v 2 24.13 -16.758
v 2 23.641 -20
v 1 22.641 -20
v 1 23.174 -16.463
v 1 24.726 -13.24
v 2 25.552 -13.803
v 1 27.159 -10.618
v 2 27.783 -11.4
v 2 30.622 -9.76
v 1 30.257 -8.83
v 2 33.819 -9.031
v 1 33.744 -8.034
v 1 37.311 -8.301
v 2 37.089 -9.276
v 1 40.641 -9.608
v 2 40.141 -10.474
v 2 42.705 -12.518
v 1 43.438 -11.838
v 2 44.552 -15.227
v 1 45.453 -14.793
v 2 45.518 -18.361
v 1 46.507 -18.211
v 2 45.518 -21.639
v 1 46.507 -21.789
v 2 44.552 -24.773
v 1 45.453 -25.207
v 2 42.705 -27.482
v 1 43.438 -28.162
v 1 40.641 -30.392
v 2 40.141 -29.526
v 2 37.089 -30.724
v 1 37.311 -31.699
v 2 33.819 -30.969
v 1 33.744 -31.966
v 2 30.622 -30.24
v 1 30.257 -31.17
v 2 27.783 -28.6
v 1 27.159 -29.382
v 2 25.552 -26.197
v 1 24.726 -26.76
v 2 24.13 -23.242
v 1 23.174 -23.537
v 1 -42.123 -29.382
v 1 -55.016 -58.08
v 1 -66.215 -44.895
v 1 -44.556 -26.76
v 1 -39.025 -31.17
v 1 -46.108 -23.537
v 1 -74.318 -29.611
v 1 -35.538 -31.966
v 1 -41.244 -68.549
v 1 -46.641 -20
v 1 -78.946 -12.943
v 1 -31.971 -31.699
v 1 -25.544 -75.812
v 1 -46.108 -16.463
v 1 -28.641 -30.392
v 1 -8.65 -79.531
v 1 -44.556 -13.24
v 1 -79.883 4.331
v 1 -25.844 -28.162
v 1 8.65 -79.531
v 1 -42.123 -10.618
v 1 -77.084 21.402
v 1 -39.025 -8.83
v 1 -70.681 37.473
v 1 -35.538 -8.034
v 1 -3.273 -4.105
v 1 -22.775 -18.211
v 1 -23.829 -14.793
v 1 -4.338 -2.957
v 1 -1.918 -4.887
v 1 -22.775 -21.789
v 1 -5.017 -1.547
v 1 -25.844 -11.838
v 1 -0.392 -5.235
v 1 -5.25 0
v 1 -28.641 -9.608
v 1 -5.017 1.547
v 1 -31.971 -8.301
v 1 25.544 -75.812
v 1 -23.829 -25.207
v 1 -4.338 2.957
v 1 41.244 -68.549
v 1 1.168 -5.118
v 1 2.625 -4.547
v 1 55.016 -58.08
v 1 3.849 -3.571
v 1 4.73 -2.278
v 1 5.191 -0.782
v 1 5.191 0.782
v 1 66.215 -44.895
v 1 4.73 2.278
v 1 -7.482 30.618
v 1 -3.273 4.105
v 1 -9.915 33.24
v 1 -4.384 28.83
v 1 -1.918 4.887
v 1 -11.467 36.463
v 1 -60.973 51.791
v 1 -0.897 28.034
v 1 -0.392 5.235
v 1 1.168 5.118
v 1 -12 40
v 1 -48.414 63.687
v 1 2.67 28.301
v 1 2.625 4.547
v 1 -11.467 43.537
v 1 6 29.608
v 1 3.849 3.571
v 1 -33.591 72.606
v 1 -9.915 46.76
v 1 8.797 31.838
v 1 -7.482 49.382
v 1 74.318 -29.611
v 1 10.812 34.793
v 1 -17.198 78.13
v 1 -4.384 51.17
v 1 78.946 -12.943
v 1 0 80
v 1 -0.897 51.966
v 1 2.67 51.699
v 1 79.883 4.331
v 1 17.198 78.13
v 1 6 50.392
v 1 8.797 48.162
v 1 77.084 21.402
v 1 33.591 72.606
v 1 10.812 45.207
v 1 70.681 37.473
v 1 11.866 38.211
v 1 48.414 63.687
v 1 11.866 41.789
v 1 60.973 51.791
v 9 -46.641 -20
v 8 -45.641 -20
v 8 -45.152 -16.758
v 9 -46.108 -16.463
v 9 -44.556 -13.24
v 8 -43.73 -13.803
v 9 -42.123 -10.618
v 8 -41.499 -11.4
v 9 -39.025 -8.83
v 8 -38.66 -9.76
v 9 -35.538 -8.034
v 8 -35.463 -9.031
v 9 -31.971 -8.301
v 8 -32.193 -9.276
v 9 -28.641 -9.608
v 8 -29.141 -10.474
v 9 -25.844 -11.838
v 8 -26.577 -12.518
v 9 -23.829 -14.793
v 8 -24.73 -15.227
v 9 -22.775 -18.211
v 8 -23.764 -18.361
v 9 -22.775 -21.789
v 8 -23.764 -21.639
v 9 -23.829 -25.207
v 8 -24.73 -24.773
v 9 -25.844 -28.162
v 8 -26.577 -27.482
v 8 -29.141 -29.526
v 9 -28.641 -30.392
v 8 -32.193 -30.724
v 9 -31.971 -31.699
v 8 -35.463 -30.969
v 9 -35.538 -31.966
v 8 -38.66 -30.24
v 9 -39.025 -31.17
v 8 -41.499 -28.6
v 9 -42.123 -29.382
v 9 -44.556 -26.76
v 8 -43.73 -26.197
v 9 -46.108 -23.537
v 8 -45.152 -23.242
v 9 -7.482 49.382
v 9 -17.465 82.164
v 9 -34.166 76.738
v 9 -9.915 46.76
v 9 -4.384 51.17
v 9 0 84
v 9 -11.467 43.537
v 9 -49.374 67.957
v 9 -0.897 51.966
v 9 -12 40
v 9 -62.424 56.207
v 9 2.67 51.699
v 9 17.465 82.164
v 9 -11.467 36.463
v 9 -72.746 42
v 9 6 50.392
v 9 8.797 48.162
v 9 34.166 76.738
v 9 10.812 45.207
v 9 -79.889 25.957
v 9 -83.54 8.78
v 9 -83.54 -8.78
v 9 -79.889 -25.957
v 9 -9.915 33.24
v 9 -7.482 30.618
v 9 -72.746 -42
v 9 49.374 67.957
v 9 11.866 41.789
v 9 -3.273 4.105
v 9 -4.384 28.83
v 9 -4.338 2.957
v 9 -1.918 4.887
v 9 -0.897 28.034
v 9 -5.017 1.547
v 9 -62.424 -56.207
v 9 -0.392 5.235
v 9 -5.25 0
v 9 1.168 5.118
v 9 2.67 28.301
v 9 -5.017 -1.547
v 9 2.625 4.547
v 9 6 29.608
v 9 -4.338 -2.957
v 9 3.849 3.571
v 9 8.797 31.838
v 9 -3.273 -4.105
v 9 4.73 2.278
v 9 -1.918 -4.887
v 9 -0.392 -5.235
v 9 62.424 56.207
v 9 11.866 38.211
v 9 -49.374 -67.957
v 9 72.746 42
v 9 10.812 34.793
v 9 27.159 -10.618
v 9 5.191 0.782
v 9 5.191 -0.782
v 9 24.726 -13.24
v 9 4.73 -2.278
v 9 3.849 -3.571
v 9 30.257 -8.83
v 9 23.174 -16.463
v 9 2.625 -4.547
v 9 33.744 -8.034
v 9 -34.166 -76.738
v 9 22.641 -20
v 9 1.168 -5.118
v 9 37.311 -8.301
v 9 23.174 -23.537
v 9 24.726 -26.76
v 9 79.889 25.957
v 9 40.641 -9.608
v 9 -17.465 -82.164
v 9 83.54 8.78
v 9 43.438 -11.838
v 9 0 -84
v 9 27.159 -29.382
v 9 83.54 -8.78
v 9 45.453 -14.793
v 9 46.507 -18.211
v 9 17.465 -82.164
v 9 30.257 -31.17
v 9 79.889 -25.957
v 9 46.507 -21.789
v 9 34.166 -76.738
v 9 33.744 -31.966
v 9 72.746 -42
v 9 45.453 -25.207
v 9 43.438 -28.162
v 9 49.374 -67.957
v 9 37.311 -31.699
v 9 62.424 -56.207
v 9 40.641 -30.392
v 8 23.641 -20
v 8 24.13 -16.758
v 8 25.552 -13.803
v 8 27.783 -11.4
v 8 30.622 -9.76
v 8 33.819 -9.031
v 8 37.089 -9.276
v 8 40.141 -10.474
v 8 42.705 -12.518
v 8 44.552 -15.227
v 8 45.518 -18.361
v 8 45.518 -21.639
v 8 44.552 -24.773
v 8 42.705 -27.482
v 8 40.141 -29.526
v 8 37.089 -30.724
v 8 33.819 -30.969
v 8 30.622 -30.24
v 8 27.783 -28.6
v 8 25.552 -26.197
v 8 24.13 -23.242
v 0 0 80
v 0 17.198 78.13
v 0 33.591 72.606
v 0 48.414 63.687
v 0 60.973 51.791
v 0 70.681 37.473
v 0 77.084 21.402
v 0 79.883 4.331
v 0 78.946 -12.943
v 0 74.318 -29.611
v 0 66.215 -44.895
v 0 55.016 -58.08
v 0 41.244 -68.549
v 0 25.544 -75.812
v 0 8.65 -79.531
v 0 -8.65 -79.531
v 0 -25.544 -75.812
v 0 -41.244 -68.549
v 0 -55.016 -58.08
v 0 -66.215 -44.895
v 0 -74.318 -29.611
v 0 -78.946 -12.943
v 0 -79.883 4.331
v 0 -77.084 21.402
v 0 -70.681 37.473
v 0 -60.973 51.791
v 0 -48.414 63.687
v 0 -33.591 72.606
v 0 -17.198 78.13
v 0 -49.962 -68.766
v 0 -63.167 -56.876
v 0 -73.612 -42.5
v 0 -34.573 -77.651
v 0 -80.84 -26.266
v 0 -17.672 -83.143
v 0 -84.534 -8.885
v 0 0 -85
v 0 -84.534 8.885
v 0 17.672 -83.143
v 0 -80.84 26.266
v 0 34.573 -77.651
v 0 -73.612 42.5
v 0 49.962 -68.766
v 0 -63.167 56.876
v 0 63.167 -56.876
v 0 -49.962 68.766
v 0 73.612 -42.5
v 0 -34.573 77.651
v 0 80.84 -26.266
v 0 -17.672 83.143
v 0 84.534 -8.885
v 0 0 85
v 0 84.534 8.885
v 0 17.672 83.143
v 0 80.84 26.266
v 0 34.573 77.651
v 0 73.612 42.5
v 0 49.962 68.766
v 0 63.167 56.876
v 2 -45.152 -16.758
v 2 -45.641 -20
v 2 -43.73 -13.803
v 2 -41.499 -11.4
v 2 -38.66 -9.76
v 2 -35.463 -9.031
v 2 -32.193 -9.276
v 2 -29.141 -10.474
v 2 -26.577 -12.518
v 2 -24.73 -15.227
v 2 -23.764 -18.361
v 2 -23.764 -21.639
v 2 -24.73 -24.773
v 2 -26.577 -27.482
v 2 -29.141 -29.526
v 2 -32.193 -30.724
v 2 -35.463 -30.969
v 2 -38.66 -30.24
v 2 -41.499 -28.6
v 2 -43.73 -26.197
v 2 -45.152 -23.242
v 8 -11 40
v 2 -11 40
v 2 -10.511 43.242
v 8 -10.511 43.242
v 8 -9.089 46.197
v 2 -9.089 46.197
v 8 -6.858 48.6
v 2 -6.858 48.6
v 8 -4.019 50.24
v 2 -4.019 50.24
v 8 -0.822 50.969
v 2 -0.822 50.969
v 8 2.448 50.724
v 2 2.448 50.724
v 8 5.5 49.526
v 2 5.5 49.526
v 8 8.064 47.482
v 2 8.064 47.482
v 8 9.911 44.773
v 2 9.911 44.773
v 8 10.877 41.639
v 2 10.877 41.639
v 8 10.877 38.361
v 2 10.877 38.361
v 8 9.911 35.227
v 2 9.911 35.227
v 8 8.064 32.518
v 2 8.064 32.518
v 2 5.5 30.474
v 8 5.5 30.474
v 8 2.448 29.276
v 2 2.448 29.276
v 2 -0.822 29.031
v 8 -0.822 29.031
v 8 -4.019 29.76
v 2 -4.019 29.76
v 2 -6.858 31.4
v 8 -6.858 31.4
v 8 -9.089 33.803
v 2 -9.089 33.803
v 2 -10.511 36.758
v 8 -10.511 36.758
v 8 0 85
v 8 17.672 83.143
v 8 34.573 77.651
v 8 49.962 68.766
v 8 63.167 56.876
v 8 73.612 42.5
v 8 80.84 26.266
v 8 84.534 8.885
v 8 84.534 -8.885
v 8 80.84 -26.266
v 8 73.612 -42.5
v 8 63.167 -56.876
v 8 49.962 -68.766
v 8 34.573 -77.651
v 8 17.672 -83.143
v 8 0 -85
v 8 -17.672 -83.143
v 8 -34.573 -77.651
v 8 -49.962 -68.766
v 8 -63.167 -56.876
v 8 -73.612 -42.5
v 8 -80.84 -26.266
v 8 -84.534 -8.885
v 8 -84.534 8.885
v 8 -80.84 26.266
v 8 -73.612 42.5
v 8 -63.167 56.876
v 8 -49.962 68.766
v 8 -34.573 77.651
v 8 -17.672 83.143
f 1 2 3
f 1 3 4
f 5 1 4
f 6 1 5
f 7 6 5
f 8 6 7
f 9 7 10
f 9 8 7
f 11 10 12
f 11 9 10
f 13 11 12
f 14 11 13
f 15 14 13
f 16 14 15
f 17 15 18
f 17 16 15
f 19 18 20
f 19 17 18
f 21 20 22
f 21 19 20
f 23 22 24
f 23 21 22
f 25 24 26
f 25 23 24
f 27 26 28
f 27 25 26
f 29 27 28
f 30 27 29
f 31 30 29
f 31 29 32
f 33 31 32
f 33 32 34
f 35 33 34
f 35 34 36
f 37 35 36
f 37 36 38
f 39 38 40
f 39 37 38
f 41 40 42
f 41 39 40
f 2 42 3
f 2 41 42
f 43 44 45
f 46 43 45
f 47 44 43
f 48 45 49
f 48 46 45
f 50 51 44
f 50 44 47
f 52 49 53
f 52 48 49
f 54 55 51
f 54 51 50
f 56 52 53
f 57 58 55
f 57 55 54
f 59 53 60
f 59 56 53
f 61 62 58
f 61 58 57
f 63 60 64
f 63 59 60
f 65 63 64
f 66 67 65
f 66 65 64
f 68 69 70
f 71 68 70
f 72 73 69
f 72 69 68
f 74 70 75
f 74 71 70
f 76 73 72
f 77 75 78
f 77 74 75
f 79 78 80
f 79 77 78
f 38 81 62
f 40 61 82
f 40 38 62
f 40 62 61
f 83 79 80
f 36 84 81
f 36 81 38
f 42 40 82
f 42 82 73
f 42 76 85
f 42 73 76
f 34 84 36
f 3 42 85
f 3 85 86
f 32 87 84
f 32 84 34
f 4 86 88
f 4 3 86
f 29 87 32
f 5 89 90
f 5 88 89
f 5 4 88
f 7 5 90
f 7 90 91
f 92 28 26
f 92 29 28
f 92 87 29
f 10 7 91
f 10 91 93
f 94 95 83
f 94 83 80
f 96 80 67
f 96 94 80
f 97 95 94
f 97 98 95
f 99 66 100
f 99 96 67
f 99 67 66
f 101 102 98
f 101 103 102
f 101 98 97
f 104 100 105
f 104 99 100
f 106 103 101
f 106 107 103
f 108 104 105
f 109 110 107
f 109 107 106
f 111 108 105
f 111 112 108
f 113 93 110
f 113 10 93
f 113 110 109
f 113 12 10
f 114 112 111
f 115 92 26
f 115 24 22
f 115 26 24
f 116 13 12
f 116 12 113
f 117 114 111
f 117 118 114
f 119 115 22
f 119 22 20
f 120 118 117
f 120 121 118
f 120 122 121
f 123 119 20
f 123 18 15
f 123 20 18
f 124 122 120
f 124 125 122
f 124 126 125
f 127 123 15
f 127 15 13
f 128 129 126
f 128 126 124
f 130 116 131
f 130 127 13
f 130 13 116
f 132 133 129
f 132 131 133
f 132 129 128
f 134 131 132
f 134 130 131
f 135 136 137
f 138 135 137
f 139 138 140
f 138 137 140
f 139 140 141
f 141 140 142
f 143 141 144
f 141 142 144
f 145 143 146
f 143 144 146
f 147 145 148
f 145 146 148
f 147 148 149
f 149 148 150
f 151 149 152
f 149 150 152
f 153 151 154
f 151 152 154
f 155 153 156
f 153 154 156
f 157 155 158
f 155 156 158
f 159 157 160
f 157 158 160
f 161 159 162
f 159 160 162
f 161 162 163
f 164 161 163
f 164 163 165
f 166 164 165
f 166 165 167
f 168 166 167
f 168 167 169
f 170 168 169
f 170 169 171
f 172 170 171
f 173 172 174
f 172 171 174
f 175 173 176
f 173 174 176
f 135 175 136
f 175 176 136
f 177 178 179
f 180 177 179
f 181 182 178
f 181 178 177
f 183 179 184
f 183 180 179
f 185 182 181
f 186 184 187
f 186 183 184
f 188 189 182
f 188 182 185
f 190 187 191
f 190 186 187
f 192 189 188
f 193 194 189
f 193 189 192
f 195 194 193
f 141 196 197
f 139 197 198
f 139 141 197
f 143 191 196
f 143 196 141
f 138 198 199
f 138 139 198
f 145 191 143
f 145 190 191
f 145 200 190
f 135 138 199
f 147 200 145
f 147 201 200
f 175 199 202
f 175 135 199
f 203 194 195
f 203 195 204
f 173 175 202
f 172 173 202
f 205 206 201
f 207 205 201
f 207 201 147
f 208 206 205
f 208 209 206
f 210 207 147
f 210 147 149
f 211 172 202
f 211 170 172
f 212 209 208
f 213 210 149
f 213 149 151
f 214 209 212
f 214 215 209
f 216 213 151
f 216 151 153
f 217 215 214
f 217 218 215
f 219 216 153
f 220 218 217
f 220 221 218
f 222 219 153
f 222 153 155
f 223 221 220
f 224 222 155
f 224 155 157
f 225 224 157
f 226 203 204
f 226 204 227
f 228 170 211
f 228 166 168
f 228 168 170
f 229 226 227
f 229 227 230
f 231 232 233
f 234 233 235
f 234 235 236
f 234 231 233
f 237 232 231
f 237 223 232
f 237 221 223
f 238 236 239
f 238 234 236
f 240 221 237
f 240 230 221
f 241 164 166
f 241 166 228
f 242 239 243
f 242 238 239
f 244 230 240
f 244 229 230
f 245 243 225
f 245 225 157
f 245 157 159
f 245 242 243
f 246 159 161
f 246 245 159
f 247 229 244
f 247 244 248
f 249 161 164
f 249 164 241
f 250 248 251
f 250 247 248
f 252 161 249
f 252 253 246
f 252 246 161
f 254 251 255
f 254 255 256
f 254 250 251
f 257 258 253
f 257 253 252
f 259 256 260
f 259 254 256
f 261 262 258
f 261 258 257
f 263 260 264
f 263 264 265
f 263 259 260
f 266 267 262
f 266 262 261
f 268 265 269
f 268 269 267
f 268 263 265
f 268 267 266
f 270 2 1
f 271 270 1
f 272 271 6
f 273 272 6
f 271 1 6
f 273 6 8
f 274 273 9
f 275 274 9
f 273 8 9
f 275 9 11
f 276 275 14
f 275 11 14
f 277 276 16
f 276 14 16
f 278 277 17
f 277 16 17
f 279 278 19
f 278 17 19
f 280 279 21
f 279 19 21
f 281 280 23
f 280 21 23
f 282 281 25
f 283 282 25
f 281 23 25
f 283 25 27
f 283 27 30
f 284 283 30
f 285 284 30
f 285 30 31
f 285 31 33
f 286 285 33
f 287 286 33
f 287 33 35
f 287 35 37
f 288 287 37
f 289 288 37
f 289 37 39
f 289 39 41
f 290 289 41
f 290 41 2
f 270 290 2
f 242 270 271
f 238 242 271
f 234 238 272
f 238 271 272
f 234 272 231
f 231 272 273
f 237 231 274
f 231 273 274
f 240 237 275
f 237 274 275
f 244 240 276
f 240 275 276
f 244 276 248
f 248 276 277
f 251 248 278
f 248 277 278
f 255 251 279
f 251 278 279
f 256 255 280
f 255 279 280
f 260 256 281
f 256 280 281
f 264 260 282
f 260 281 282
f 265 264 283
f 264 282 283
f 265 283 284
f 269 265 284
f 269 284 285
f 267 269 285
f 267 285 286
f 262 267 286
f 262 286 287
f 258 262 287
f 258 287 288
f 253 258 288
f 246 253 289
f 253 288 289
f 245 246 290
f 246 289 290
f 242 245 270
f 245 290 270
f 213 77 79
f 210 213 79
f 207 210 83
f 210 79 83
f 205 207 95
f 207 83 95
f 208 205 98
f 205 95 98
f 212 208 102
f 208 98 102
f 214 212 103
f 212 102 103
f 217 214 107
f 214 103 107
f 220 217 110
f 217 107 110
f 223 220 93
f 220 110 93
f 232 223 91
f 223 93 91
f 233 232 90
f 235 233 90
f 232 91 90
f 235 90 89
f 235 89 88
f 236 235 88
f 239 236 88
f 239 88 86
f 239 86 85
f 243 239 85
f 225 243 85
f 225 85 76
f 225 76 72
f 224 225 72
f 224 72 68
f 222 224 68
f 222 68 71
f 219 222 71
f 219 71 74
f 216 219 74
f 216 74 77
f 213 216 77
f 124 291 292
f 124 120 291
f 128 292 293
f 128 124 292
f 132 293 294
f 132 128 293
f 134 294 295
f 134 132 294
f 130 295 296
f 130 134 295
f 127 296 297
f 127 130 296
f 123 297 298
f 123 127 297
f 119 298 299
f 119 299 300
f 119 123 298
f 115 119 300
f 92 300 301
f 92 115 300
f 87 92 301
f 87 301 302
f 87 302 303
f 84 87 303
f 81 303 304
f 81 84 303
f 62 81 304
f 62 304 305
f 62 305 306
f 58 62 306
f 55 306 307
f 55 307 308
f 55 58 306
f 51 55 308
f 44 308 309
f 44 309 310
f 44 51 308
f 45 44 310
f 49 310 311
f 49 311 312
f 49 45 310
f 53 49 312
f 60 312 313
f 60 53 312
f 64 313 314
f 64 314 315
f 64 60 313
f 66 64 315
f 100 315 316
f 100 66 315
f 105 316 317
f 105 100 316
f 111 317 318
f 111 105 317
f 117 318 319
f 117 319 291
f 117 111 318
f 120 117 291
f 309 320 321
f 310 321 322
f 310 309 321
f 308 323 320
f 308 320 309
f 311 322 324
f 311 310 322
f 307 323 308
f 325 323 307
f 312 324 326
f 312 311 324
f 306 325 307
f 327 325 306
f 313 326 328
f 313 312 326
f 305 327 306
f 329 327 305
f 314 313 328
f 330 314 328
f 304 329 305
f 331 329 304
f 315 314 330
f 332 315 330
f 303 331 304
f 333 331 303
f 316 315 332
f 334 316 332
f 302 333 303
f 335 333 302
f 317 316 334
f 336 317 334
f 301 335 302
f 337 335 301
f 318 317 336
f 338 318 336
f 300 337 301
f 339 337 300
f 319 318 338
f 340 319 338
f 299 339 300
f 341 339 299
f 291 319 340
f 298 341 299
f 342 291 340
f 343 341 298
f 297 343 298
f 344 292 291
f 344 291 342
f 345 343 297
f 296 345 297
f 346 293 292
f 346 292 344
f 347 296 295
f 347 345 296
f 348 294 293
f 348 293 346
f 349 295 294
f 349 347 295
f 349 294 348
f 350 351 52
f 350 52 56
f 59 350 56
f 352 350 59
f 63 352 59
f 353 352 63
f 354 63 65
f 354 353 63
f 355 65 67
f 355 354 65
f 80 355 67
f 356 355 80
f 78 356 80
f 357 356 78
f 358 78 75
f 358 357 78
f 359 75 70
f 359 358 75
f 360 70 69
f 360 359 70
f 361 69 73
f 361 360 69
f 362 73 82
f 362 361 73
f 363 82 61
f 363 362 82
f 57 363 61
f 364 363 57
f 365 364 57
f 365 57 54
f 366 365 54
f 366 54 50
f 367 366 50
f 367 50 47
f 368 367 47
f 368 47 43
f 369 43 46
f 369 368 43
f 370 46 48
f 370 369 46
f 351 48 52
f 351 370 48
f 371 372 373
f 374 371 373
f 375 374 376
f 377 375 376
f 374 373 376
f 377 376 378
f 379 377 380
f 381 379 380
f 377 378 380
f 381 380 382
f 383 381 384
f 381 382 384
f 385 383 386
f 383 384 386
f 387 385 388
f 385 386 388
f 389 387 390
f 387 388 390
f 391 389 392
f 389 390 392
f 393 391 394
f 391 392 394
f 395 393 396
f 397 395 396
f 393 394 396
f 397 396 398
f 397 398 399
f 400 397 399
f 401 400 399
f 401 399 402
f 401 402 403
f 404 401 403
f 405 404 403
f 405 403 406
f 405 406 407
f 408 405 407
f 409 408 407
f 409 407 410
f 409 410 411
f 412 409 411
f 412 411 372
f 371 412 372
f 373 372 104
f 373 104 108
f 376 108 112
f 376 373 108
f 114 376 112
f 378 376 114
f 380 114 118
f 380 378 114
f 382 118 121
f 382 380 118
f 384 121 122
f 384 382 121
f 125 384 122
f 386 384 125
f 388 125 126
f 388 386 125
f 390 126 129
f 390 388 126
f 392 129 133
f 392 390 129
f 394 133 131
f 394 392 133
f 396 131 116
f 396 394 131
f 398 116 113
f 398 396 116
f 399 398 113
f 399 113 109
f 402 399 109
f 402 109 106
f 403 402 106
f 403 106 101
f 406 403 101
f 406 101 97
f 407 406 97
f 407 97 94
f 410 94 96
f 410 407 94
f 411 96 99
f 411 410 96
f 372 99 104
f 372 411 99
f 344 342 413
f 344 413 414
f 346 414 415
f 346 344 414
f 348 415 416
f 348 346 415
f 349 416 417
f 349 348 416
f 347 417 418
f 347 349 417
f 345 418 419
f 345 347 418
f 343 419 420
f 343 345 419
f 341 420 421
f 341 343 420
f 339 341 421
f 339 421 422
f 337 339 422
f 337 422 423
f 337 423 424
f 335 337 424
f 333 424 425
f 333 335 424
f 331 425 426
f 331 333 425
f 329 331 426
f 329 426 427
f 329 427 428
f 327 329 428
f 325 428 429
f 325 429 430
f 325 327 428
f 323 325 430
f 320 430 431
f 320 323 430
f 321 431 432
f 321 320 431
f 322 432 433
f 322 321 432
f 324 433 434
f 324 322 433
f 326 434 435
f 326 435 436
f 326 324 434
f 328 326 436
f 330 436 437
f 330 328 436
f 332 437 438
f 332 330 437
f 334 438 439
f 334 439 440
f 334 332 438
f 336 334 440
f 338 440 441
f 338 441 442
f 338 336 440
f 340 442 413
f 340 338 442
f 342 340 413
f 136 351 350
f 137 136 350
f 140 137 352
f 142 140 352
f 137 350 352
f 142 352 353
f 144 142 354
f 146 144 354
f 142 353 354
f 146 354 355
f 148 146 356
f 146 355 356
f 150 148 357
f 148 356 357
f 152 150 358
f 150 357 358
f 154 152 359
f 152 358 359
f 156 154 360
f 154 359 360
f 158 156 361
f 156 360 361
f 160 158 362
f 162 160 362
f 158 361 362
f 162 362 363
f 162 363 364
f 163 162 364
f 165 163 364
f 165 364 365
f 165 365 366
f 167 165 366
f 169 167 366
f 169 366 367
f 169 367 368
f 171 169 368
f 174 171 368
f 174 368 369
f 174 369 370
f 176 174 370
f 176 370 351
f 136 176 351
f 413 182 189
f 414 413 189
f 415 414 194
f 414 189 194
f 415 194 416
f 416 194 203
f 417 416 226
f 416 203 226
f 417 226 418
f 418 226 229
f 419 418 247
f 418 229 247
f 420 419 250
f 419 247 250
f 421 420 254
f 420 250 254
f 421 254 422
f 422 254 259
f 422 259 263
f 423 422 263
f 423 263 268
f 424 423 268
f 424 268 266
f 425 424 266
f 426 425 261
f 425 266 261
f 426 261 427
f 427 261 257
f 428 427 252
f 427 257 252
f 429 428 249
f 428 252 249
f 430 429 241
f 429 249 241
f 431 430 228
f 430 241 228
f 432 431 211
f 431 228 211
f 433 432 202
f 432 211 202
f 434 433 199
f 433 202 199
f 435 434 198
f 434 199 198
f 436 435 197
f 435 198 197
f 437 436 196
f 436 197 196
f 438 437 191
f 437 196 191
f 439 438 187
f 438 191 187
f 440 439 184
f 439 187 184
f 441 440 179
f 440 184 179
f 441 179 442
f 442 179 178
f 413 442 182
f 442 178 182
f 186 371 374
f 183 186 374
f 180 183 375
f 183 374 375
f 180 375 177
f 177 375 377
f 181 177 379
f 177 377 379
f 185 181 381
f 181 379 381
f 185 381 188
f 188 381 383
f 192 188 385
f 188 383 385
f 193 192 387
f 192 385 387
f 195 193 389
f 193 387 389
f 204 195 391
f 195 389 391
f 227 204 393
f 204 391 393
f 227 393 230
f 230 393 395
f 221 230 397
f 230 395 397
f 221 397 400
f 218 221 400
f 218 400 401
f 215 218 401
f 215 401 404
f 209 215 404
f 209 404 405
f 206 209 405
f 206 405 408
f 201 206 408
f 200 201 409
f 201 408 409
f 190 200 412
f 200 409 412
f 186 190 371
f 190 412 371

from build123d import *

# Parameters (mm, degrees)
F3_D    = 10.5
F5_D    = 22
F6_SIZE = 1


with BuildPart() as f1:
    # F0 (on Front) → F1 (revolve)
    with BuildSketch(Plane.XZ):
        Polygon((0, 85), (0, 80), (1, 80), (1, 0), (9, 0), (9, 85), align=None)
    revolve(axis=Axis((5, 0, 0), (-1, 0, 0)))

    # F3 (through all)
    with Locations(Plane.YZ.offset(9)):
        with Locations((0, 0)):
            Hole(F3_D / 2)

    # F5 (through all)
    with Locations(Plane.YZ.offset(9)):
        with Locations((0, 40), (34.6410161514, -20), (-34.6410161514, -20)):
            Hole(F5_D / 2)

    # F6
    f6_edges = [f1.edges().sort_by_distance(p)[0] for p in [
        (9, 0, -85),
        (9, -45.641016, -20),
        (9, -11, 40),
        (9, 23.641016, -20),
        (1, -45.641016, -20),
        (1, 23.641016, -20),
        (1, -11, 40),
    ]]
    chamfer(f6_edges, length=F6_SIZE)


solid = f1.part
